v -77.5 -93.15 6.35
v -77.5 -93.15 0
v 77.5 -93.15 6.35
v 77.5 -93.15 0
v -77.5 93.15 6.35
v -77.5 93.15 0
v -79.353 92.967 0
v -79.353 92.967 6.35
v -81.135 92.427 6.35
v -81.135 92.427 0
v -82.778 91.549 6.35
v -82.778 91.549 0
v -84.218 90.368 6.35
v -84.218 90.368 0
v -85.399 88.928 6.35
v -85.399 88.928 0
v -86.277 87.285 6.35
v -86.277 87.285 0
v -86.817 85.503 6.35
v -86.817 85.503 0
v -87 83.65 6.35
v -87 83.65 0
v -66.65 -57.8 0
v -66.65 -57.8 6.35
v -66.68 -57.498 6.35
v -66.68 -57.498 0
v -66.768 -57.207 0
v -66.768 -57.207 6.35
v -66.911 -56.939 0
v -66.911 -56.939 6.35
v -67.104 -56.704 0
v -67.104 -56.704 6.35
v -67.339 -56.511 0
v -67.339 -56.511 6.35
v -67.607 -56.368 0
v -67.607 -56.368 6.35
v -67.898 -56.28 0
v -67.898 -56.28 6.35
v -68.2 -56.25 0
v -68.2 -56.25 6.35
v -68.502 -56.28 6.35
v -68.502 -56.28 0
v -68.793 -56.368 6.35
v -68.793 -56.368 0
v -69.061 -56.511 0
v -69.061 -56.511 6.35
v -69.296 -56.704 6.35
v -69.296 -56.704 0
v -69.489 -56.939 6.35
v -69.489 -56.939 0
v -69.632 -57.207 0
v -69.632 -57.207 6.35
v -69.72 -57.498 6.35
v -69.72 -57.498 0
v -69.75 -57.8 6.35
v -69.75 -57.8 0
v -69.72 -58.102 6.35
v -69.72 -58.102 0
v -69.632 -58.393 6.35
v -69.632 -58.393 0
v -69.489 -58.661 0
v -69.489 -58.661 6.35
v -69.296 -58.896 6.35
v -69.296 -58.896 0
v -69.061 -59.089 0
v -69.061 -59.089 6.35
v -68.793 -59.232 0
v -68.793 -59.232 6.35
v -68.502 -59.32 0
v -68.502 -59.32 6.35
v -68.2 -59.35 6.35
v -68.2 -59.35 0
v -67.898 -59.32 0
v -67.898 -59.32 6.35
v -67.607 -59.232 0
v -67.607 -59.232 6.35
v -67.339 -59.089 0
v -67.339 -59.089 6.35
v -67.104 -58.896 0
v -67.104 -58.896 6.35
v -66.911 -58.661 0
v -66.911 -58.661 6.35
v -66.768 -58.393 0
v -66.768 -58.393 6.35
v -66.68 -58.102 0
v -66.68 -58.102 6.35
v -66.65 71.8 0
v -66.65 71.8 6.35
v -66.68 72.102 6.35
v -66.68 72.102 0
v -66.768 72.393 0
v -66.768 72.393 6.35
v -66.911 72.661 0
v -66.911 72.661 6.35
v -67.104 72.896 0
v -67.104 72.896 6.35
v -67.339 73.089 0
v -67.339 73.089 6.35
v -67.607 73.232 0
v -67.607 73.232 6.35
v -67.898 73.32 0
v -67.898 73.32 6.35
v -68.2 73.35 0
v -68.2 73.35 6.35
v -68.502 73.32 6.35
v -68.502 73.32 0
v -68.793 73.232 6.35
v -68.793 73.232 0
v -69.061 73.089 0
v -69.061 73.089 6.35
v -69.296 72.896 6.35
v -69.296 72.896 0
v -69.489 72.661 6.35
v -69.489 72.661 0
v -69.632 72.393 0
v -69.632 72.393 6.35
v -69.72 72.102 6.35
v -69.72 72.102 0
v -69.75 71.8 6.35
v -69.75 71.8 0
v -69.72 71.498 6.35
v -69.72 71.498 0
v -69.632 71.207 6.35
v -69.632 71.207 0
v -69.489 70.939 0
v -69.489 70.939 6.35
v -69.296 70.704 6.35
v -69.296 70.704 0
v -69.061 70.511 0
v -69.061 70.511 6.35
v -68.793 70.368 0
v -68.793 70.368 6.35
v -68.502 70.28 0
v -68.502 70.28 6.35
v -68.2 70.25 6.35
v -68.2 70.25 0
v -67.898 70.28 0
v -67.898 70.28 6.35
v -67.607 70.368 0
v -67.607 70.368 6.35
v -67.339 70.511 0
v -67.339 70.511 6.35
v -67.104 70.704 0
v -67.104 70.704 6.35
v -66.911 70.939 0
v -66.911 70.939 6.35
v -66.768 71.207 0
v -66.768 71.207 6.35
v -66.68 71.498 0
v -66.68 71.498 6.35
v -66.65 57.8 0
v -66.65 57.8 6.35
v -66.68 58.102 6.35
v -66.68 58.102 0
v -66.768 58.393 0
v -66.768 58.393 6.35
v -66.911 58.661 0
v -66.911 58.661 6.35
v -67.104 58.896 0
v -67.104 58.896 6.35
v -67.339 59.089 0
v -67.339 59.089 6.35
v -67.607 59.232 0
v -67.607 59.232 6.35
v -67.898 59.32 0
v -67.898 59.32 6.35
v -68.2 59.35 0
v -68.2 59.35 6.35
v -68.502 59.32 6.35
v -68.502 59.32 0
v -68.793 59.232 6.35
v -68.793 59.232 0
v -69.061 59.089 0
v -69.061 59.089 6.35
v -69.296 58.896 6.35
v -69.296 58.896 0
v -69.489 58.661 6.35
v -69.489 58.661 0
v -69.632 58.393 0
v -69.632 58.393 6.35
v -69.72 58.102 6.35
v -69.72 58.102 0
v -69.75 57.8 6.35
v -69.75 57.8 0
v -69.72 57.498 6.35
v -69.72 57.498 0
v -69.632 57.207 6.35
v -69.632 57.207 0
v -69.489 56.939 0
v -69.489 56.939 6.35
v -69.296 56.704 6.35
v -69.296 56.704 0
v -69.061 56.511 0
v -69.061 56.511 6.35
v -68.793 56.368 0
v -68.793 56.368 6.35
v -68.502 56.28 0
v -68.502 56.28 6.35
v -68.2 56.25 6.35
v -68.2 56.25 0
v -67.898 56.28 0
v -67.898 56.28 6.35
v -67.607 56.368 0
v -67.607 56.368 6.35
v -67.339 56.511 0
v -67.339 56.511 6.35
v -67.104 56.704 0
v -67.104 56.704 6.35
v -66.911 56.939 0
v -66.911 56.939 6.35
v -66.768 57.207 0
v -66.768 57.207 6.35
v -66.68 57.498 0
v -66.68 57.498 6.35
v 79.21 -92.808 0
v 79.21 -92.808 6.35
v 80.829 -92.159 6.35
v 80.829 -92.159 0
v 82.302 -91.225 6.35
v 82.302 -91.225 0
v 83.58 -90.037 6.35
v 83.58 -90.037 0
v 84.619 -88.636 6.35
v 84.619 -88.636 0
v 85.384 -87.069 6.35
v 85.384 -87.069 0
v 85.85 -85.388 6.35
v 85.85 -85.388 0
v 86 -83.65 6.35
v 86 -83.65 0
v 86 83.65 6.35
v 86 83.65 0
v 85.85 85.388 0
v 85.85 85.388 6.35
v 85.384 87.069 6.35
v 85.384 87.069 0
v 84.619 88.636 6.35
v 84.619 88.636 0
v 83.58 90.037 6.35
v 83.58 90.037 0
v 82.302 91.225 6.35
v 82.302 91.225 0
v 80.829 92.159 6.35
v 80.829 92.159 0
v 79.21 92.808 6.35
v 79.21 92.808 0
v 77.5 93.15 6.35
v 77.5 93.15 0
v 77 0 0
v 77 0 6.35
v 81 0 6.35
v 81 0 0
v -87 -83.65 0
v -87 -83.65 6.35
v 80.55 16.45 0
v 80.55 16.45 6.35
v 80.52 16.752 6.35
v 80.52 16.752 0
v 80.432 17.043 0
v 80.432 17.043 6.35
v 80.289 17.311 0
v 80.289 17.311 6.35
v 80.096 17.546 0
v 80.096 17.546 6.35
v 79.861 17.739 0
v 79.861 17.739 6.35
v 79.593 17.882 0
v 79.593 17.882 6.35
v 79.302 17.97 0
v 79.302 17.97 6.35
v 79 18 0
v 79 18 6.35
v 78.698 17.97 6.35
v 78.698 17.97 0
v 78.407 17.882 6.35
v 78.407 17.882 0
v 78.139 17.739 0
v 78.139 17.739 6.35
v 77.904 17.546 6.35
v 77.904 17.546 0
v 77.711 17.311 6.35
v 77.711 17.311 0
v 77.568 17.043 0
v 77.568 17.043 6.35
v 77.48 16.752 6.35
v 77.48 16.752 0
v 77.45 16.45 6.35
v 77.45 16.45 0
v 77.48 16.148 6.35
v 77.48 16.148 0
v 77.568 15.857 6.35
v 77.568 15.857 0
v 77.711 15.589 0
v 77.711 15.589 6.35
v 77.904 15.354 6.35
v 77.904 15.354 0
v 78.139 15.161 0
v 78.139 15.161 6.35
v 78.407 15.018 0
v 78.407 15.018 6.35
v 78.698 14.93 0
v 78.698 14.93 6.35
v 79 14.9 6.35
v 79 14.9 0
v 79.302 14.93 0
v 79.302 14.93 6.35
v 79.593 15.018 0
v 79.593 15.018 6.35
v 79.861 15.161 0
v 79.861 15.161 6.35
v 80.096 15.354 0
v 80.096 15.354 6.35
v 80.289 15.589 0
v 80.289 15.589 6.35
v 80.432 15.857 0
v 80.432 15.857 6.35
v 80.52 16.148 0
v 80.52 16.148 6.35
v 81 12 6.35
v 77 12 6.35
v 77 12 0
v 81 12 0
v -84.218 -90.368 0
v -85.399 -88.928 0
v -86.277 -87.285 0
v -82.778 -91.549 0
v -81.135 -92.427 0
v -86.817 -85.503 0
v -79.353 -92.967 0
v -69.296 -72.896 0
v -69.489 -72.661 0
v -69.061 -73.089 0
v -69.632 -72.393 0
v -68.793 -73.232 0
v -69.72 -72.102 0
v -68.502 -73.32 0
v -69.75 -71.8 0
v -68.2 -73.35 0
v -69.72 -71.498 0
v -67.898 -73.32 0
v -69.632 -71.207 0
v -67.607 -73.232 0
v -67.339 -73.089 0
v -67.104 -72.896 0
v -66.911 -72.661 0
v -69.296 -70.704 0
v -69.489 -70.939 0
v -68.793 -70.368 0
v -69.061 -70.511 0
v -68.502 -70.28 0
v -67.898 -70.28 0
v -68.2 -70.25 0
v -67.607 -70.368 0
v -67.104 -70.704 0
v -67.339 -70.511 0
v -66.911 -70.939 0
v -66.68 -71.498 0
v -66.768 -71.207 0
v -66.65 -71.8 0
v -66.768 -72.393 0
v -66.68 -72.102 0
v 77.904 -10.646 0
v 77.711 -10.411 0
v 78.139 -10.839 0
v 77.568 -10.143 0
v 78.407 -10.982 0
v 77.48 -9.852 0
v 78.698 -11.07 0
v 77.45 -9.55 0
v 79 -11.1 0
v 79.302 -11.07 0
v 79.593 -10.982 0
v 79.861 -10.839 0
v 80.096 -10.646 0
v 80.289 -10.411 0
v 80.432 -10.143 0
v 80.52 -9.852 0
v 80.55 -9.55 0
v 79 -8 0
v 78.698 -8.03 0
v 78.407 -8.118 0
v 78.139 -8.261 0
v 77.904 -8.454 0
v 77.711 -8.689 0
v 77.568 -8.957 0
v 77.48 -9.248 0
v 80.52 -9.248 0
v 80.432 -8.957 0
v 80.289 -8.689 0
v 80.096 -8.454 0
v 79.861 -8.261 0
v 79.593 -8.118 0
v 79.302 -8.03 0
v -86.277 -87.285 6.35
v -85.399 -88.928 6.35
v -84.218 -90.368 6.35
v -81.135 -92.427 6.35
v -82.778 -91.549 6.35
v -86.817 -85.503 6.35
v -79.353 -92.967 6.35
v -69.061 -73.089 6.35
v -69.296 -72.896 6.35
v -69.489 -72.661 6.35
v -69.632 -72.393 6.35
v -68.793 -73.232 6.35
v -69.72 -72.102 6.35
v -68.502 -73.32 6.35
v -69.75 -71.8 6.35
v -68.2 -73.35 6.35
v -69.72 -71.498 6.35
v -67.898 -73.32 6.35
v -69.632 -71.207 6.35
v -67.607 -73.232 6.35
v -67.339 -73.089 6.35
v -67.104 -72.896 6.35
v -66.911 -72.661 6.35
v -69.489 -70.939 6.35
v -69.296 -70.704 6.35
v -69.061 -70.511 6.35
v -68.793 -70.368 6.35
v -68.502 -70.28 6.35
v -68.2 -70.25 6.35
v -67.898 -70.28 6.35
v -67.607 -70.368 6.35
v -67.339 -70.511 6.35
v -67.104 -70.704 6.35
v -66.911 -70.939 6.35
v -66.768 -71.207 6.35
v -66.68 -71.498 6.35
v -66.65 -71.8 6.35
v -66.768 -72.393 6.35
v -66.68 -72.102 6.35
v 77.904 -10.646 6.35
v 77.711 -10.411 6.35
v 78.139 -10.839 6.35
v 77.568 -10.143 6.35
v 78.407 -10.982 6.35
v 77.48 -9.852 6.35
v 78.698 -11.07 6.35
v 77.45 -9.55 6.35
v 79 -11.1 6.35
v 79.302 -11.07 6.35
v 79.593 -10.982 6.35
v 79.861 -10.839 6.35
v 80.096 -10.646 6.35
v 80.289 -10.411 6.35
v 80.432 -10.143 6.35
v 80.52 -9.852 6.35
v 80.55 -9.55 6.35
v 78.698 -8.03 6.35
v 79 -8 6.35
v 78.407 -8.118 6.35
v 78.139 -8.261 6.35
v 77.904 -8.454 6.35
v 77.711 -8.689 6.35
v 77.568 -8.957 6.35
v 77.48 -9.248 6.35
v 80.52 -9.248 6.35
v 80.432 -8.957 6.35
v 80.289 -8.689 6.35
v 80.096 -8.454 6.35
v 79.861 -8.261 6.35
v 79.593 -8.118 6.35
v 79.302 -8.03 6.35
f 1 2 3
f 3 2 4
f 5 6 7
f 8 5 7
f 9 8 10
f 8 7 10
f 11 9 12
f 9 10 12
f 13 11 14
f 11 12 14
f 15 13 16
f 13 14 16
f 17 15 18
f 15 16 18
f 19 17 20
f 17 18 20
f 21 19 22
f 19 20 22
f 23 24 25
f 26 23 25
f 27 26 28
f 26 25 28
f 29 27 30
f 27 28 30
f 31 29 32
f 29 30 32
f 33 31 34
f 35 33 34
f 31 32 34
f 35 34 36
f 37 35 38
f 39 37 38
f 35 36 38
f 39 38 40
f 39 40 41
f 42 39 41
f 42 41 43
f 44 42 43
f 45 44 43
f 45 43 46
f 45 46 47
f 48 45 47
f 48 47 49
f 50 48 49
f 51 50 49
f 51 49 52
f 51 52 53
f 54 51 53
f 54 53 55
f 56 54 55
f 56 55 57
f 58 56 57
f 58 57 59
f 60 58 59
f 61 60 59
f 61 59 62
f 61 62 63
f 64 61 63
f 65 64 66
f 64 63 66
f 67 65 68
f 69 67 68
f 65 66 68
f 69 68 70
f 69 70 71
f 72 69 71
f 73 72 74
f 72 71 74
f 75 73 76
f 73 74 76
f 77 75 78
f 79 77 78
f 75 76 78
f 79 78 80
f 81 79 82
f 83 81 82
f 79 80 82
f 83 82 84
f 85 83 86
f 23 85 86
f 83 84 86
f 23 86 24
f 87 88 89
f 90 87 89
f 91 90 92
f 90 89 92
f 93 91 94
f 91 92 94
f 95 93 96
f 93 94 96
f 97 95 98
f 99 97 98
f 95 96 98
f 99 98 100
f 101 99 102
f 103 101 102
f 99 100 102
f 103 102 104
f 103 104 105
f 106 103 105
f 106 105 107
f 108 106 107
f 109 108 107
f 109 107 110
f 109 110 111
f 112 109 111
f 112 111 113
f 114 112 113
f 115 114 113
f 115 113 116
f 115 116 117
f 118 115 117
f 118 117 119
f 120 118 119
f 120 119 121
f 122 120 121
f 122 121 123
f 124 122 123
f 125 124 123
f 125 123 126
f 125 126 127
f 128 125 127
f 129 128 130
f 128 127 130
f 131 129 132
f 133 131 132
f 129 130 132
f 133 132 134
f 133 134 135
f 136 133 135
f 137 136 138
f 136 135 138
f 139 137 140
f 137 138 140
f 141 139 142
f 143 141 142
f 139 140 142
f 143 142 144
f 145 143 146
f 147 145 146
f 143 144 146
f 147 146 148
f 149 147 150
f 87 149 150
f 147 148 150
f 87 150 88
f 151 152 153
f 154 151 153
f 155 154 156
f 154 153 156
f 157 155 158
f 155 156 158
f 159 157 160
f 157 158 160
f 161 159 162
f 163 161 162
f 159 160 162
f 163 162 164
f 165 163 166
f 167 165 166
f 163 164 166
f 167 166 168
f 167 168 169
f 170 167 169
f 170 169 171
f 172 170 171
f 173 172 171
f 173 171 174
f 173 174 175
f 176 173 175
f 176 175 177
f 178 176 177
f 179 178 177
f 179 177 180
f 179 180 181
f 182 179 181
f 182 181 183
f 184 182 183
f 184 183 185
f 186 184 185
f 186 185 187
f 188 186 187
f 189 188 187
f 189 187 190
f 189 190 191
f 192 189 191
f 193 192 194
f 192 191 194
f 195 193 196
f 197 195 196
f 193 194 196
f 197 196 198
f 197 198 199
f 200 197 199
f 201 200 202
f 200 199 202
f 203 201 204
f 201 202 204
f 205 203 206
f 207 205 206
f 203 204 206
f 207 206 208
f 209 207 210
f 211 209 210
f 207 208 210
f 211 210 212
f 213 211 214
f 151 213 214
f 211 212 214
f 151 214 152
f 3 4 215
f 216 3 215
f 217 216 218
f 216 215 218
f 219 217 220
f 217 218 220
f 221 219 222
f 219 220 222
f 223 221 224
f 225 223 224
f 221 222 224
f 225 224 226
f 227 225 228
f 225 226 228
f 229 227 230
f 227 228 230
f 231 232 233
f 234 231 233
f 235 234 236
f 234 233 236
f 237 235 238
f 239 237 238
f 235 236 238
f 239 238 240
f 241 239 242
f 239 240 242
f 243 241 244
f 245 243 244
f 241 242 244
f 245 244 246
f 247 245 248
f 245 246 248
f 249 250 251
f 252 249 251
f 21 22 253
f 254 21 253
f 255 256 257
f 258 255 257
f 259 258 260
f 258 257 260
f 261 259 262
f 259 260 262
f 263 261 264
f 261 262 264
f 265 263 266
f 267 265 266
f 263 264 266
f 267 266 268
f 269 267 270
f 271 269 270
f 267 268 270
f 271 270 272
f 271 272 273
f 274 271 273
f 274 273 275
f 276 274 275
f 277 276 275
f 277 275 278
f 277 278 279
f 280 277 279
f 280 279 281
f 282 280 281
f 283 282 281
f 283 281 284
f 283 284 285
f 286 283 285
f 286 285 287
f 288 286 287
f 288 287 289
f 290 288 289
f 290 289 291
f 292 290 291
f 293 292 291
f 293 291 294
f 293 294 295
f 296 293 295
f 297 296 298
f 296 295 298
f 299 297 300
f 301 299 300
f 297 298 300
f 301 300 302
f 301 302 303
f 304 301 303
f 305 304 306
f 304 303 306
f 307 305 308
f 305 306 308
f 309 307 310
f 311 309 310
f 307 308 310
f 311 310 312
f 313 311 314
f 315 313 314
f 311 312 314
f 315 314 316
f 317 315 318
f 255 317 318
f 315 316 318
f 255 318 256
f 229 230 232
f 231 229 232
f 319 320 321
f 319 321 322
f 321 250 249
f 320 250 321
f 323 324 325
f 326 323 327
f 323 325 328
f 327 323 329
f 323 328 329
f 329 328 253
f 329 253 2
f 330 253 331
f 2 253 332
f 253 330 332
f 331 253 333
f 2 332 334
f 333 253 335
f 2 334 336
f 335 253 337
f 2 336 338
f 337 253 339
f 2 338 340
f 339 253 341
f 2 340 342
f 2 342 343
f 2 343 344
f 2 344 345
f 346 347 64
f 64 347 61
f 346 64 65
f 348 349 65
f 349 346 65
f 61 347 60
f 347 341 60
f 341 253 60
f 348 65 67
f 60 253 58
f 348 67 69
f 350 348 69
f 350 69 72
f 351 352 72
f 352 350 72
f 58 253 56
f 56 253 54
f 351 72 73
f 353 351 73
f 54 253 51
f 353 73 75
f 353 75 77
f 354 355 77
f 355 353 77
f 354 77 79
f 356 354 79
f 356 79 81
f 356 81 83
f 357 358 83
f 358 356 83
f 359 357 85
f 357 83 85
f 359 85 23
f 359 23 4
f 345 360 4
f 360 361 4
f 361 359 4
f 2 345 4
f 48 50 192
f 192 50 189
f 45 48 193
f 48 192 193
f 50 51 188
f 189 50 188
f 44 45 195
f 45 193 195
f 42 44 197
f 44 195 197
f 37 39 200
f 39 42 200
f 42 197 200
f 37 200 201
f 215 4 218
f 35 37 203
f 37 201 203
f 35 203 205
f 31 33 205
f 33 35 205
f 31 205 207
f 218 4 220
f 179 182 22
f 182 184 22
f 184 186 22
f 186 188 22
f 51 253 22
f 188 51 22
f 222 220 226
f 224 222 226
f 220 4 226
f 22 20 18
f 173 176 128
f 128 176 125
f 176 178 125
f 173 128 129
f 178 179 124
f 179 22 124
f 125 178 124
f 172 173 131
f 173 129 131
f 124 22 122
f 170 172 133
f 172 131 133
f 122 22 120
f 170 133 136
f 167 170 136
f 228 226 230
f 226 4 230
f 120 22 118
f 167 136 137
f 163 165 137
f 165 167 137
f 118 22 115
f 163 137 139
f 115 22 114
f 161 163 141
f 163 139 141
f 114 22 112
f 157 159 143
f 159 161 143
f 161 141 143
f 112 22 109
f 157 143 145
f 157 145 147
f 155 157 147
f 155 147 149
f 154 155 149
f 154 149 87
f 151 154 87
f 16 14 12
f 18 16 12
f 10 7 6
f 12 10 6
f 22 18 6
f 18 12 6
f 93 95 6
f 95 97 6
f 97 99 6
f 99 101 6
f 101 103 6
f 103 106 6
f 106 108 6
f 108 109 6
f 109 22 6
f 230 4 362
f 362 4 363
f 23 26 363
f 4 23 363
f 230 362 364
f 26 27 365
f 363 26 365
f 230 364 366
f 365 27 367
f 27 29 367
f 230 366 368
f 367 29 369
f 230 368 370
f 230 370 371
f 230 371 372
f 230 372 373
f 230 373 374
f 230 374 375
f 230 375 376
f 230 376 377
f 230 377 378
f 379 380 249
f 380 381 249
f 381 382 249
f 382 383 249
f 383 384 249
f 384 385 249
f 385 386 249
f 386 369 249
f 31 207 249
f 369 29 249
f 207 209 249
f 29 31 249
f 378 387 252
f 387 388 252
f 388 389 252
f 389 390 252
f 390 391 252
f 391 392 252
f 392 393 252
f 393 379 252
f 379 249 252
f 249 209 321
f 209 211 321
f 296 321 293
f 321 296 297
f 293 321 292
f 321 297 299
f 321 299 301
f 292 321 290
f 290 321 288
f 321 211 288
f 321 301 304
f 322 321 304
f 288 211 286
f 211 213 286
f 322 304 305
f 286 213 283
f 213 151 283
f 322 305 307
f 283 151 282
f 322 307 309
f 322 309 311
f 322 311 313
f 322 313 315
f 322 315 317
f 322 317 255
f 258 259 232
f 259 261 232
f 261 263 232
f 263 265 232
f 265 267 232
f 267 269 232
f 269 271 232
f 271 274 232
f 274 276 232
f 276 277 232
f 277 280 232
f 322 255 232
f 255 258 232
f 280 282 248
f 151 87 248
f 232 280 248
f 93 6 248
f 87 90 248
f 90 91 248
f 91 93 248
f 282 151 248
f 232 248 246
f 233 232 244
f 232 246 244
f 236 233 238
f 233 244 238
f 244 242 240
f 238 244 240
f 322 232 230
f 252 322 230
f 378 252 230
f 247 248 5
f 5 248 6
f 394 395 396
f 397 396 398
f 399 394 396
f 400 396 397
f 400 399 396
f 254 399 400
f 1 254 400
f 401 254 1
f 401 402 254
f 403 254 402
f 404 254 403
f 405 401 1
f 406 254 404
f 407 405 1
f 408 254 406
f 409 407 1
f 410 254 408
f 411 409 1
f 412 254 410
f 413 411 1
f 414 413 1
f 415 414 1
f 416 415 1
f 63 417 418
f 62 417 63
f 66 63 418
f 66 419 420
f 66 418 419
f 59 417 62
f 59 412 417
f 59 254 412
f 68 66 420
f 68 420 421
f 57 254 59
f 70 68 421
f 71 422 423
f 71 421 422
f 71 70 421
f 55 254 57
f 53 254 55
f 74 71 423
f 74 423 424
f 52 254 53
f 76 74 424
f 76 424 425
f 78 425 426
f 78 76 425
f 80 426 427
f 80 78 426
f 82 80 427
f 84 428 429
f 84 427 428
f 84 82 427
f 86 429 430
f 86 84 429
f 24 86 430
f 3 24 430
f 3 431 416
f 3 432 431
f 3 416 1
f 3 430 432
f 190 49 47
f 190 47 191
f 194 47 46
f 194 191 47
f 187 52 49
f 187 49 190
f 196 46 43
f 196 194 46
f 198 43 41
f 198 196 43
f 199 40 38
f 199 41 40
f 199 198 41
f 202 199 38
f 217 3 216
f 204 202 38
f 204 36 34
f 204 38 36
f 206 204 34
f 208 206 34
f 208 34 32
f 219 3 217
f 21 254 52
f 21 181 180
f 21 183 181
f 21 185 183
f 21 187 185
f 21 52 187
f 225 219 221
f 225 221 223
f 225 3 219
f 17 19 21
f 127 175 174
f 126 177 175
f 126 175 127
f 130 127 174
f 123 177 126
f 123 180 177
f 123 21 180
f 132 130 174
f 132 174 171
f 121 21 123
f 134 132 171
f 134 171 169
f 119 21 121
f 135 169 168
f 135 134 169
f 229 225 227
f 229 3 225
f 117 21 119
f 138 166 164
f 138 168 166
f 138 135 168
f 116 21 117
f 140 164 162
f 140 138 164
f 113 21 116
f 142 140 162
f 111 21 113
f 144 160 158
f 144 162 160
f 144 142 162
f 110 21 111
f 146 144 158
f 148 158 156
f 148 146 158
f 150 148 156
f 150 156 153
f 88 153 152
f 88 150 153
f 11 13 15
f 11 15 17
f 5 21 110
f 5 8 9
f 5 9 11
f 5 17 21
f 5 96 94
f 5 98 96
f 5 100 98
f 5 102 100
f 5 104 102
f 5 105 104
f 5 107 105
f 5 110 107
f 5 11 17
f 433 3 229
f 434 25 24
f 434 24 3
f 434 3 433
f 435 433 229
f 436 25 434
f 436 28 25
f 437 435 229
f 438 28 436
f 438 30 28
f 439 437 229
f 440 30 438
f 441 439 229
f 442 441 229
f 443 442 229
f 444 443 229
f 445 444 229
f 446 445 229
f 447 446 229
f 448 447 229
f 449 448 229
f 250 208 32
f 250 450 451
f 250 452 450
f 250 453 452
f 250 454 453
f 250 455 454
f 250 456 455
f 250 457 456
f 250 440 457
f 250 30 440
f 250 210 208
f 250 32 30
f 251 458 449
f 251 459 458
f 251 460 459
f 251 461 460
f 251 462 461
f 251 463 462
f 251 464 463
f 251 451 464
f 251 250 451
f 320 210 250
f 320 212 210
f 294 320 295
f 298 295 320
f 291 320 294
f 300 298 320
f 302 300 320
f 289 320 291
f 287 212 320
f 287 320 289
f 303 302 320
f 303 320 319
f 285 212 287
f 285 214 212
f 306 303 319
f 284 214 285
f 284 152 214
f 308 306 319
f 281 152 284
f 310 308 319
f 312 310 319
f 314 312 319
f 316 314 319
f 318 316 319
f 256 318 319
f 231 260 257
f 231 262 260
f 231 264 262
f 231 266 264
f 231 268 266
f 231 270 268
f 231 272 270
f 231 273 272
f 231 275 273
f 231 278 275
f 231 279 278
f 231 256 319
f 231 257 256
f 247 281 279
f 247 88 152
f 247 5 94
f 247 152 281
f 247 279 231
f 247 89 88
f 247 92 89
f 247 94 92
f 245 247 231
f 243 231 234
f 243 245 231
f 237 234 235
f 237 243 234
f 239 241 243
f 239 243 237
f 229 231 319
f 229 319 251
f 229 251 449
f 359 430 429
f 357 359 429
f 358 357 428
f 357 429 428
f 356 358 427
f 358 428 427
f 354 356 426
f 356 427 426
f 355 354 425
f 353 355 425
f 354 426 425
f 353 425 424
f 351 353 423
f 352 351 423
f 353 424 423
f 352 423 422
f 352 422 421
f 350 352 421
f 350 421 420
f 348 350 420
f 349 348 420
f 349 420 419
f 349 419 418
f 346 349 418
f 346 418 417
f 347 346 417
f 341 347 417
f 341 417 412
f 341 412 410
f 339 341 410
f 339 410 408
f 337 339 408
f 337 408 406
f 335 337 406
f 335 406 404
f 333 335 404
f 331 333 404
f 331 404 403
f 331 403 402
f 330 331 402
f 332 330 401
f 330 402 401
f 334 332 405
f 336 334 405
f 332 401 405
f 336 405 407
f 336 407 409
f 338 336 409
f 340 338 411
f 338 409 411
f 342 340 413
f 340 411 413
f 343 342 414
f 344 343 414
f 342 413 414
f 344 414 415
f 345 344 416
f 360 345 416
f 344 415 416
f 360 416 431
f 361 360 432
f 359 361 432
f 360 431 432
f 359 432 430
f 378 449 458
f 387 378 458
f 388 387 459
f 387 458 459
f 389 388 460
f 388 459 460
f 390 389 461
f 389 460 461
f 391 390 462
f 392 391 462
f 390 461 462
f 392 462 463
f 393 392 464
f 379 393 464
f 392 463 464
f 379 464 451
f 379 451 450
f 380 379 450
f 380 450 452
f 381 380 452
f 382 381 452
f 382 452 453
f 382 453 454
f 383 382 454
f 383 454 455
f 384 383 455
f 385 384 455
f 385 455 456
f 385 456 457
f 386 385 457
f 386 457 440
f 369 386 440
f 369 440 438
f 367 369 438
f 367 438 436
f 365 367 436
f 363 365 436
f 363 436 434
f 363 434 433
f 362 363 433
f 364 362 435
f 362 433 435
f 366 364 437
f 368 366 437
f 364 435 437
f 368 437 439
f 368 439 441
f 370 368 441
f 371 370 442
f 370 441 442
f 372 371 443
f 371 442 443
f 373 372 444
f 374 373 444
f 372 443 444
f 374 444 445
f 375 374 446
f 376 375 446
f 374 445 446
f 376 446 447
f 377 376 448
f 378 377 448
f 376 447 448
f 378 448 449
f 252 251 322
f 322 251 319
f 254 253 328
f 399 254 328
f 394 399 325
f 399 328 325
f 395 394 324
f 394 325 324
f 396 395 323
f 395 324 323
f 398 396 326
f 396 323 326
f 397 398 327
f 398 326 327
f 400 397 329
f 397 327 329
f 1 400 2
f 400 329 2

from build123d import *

# Parameters (mm, degrees)
BOSS_EXTRUDE1_DEPTH = 6.35
SKETCH3_W           = 4
SKETCH3_H           = 12
CUT_EXTRUDE1_DEPTH  = 6.35
SKETCH4_R           = 1.55
CUT_EXTRUDE2_DEPTH  = 7.35
SKETCH5_R           = 1.55
CUT_EXTRUDE3_DEPTH  = 7.35


with BuildPart() as part:
    # Sketch2 → Boss-Extrude1 (new body)
    with BuildSketch(Plane.XY):
        with BuildLine():
            Line((77.5, 93.15), (-77.5, 93.15))
            ThreePointArc((-77.5, 93.15), (-84.217514421, 90.367514421), (-87, 83.65))
            Line((-87, 83.65), (-87, -83.65))
            ThreePointArc((-87, -83.65), (-84.217514421, -90.367514421), (-77.5, -93.15))
            Line((-77.5, -93.15), (77.5, -93.15))
            ThreePointArc((77.5, -93.15), (83.579939001, -90.037313843), (86, -83.65))
            Line((86, -83.65), (86, 83.65))
            ThreePointArc((86, 83.65), (83.579939001, 90.037313843), (77.5, 93.15))
        make_face()
    extrude(amount=BOSS_EXTRUDE1_DEPTH)

    # Sketch3 → Cut-Extrude1 (cut)
    with BuildSketch(Plane.XY.offset(6.35)):
        with Locations((79, 6)):
            Rectangle(SKETCH3_W, SKETCH3_H)
    extrude(amount=-CUT_EXTRUDE1_DEPTH, mode=Mode.SUBTRACT)

    # Sketch4 → Cut-Extrude2 (cut, through all)
    with BuildSketch(Plane.XY.offset(6.35)):
        with Locations((-68.2, 71.8)):
            Circle(SKETCH4_R)
        with Locations((-68.2, 57.8)):
            Circle(SKETCH4_R)
        with Locations((-68.2, -57.8)):
            Circle(SKETCH4_R)
        with Locations((-68.2, -71.8)):
            Circle(SKETCH4_R)
    extrude(amount=-CUT_EXTRUDE2_DEPTH, mode=Mode.SUBTRACT)

    # Sketch5 → Cut-Extrude3 (cut, through all)
    with BuildSketch(Plane.XY.offset(6.35)):
        with Locations((79, 16.45)):
            Circle(SKETCH5_R)
        with Locations((79, -9.55)):
            Circle(SKETCH5_R)
    extrude(amount=-CUT_EXTRUDE3_DEPTH, mode=Mode.SUBTRACT)


solid = part.part
